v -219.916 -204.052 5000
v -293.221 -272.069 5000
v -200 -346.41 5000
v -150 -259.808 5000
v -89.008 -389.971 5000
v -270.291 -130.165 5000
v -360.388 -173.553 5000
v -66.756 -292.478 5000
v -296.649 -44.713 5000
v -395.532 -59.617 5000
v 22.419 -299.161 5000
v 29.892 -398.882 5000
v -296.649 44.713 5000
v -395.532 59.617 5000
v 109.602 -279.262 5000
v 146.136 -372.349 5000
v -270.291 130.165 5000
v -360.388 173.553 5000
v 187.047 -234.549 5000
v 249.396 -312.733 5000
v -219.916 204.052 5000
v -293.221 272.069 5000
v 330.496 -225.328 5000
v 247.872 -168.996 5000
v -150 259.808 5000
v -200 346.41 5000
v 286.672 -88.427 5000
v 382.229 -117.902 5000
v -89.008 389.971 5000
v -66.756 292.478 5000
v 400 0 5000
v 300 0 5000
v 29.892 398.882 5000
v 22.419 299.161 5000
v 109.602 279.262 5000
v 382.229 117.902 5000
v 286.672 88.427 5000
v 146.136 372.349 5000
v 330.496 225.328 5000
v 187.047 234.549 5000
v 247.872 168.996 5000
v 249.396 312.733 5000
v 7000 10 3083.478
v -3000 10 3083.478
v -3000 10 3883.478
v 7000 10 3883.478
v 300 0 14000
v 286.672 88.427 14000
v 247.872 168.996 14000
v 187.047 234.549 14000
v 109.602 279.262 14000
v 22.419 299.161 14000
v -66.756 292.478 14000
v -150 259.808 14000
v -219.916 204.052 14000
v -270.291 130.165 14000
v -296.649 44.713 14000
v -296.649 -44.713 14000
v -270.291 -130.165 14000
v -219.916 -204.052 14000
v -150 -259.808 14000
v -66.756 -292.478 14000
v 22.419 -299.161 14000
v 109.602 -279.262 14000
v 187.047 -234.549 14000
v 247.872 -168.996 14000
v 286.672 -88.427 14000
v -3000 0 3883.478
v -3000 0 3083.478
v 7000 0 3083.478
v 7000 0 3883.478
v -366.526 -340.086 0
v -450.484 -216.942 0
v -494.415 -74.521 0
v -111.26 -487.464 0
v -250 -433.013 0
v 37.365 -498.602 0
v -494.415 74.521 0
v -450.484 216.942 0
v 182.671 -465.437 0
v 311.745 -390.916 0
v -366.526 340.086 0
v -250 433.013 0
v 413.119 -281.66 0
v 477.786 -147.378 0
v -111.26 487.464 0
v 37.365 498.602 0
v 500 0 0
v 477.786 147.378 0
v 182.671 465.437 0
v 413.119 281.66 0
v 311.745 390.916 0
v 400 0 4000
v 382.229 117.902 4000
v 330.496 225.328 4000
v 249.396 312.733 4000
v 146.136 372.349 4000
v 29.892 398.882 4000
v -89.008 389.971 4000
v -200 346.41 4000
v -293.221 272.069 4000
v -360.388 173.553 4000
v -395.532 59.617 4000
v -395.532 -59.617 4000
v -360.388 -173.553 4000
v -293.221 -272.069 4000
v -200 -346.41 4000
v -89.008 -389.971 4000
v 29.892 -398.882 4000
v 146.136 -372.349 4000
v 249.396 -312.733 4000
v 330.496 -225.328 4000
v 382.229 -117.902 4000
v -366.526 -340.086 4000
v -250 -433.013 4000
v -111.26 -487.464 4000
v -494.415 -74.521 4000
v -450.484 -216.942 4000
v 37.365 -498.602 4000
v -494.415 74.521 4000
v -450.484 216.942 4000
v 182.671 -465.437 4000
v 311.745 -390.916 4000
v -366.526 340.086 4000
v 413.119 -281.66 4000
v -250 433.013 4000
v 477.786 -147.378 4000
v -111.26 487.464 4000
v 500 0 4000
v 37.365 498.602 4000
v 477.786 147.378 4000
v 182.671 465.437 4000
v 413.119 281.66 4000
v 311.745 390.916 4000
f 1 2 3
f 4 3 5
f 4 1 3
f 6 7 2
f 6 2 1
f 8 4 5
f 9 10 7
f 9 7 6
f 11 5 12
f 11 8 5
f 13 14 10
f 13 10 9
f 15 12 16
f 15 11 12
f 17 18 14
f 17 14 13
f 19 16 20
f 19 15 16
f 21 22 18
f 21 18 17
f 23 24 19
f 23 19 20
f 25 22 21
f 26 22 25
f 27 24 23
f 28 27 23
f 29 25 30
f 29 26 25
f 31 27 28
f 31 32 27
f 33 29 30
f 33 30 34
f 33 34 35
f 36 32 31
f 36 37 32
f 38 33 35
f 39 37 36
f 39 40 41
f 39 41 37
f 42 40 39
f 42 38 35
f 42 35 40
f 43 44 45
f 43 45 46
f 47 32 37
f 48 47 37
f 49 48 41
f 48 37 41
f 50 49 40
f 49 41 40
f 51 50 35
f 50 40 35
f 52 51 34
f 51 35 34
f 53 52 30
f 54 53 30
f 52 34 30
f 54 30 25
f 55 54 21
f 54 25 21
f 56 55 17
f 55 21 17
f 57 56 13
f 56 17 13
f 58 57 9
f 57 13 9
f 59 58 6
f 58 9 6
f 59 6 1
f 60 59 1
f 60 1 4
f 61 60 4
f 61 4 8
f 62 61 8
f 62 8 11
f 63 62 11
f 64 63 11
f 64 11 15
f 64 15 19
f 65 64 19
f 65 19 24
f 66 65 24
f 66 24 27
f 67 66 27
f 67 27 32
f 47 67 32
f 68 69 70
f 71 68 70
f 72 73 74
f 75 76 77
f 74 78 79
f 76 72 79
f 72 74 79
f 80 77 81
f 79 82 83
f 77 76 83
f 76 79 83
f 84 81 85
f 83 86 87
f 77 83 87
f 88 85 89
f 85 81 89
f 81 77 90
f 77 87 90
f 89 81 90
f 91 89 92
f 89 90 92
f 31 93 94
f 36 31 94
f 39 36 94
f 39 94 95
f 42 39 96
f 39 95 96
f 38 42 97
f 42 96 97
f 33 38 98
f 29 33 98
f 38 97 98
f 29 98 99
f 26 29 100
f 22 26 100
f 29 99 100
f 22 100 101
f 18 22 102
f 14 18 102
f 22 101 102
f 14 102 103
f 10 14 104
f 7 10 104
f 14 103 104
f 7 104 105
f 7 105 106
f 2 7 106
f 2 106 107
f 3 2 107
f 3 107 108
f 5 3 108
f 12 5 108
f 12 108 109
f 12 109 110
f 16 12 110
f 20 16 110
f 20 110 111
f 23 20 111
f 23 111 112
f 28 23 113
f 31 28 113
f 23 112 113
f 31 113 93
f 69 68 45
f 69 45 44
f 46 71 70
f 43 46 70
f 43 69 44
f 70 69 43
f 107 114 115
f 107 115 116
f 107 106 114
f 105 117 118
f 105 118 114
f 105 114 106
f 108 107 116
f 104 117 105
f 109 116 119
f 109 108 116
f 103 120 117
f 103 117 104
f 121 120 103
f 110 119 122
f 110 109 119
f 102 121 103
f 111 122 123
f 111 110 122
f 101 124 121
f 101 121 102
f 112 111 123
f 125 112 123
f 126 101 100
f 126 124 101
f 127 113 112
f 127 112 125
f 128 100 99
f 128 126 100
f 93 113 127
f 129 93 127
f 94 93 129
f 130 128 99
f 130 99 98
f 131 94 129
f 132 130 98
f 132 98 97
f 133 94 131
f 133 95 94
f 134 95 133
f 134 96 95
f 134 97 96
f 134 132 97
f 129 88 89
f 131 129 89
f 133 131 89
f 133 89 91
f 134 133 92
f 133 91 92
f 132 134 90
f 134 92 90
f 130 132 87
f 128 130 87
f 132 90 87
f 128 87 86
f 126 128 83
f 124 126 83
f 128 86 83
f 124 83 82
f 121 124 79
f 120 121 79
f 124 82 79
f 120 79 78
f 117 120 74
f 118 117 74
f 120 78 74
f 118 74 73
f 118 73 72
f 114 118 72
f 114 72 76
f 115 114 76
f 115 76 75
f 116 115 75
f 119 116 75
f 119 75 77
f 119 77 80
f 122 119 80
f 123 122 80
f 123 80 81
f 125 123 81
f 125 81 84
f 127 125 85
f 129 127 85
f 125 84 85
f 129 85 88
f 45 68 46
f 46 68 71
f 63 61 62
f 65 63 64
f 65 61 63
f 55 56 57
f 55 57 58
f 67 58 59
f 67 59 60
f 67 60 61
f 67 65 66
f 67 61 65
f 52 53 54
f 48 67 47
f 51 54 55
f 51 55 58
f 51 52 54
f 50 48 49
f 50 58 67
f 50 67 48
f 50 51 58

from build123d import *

# Parameters (mm, degrees)
SKETCH_1_R      = 500
EXTRUDE_1_DEPTH = 4000
SKETCH_2_R      = 300
EXTRUDE_2_DEPTH = 10000
SKETCH_6_W      = 10000
SKETCH_6_H      = 800
EXTRUDE_6_DEPTH = 10
SKETCH_7_R      = 400
EXTRUDE_7_DEPTH = 1000


with BuildPart() as part:
    # 草图1 → 凸台-拉伸1 (new body)
    with BuildSketch(Plane.XY):
        Circle(SKETCH_1_R)
    extrude(amount=EXTRUDE_1_DEPTH)

    # 草图2 → 凸台-拉伸2 (add)
    with BuildSketch(Plane.XY.offset(4000)):
        Circle(SKETCH_2_R)
    extrude(amount=EXTRUDE_2_DEPTH)

    # 草图7 → 凸台-拉伸7 (add)
    with BuildSketch(Plane.XY.offset(4000)):
        Circle(SKETCH_7_R)
    extrude(amount=EXTRUDE_7_DEPTH)


with BuildPart() as body_2:
    # 草图6 → 凸台-拉伸6 (new body)
    with BuildSketch(Plane(origin=(0, 0, 0), x_dir=(1, 0, 0), z_dir=(0, 1, 0))):
        with Locations((2000, -900)):
            Rectangle(SKETCH_6_W, SKETCH_6_H)
    extrude(amount=EXTRUDE_6_DEPTH)


with BuildPart() as body_2_1:
    # Move Body 1: moved
    add(body_2.part.moved(Location((0, 0, 1049.359545166))))


with BuildPart() as body_2_2:
    # Move Body 2: moved
    add(body_2_1.part.moved(Location((0, 0, 2037.417385346))))


with BuildPart() as body_2_3:
    # Move Body 3: moved
    add(body_2_2.part.moved(Location((0, 0, -503.298752827))))


solid = Compound([part.part, body_2_3.part])
